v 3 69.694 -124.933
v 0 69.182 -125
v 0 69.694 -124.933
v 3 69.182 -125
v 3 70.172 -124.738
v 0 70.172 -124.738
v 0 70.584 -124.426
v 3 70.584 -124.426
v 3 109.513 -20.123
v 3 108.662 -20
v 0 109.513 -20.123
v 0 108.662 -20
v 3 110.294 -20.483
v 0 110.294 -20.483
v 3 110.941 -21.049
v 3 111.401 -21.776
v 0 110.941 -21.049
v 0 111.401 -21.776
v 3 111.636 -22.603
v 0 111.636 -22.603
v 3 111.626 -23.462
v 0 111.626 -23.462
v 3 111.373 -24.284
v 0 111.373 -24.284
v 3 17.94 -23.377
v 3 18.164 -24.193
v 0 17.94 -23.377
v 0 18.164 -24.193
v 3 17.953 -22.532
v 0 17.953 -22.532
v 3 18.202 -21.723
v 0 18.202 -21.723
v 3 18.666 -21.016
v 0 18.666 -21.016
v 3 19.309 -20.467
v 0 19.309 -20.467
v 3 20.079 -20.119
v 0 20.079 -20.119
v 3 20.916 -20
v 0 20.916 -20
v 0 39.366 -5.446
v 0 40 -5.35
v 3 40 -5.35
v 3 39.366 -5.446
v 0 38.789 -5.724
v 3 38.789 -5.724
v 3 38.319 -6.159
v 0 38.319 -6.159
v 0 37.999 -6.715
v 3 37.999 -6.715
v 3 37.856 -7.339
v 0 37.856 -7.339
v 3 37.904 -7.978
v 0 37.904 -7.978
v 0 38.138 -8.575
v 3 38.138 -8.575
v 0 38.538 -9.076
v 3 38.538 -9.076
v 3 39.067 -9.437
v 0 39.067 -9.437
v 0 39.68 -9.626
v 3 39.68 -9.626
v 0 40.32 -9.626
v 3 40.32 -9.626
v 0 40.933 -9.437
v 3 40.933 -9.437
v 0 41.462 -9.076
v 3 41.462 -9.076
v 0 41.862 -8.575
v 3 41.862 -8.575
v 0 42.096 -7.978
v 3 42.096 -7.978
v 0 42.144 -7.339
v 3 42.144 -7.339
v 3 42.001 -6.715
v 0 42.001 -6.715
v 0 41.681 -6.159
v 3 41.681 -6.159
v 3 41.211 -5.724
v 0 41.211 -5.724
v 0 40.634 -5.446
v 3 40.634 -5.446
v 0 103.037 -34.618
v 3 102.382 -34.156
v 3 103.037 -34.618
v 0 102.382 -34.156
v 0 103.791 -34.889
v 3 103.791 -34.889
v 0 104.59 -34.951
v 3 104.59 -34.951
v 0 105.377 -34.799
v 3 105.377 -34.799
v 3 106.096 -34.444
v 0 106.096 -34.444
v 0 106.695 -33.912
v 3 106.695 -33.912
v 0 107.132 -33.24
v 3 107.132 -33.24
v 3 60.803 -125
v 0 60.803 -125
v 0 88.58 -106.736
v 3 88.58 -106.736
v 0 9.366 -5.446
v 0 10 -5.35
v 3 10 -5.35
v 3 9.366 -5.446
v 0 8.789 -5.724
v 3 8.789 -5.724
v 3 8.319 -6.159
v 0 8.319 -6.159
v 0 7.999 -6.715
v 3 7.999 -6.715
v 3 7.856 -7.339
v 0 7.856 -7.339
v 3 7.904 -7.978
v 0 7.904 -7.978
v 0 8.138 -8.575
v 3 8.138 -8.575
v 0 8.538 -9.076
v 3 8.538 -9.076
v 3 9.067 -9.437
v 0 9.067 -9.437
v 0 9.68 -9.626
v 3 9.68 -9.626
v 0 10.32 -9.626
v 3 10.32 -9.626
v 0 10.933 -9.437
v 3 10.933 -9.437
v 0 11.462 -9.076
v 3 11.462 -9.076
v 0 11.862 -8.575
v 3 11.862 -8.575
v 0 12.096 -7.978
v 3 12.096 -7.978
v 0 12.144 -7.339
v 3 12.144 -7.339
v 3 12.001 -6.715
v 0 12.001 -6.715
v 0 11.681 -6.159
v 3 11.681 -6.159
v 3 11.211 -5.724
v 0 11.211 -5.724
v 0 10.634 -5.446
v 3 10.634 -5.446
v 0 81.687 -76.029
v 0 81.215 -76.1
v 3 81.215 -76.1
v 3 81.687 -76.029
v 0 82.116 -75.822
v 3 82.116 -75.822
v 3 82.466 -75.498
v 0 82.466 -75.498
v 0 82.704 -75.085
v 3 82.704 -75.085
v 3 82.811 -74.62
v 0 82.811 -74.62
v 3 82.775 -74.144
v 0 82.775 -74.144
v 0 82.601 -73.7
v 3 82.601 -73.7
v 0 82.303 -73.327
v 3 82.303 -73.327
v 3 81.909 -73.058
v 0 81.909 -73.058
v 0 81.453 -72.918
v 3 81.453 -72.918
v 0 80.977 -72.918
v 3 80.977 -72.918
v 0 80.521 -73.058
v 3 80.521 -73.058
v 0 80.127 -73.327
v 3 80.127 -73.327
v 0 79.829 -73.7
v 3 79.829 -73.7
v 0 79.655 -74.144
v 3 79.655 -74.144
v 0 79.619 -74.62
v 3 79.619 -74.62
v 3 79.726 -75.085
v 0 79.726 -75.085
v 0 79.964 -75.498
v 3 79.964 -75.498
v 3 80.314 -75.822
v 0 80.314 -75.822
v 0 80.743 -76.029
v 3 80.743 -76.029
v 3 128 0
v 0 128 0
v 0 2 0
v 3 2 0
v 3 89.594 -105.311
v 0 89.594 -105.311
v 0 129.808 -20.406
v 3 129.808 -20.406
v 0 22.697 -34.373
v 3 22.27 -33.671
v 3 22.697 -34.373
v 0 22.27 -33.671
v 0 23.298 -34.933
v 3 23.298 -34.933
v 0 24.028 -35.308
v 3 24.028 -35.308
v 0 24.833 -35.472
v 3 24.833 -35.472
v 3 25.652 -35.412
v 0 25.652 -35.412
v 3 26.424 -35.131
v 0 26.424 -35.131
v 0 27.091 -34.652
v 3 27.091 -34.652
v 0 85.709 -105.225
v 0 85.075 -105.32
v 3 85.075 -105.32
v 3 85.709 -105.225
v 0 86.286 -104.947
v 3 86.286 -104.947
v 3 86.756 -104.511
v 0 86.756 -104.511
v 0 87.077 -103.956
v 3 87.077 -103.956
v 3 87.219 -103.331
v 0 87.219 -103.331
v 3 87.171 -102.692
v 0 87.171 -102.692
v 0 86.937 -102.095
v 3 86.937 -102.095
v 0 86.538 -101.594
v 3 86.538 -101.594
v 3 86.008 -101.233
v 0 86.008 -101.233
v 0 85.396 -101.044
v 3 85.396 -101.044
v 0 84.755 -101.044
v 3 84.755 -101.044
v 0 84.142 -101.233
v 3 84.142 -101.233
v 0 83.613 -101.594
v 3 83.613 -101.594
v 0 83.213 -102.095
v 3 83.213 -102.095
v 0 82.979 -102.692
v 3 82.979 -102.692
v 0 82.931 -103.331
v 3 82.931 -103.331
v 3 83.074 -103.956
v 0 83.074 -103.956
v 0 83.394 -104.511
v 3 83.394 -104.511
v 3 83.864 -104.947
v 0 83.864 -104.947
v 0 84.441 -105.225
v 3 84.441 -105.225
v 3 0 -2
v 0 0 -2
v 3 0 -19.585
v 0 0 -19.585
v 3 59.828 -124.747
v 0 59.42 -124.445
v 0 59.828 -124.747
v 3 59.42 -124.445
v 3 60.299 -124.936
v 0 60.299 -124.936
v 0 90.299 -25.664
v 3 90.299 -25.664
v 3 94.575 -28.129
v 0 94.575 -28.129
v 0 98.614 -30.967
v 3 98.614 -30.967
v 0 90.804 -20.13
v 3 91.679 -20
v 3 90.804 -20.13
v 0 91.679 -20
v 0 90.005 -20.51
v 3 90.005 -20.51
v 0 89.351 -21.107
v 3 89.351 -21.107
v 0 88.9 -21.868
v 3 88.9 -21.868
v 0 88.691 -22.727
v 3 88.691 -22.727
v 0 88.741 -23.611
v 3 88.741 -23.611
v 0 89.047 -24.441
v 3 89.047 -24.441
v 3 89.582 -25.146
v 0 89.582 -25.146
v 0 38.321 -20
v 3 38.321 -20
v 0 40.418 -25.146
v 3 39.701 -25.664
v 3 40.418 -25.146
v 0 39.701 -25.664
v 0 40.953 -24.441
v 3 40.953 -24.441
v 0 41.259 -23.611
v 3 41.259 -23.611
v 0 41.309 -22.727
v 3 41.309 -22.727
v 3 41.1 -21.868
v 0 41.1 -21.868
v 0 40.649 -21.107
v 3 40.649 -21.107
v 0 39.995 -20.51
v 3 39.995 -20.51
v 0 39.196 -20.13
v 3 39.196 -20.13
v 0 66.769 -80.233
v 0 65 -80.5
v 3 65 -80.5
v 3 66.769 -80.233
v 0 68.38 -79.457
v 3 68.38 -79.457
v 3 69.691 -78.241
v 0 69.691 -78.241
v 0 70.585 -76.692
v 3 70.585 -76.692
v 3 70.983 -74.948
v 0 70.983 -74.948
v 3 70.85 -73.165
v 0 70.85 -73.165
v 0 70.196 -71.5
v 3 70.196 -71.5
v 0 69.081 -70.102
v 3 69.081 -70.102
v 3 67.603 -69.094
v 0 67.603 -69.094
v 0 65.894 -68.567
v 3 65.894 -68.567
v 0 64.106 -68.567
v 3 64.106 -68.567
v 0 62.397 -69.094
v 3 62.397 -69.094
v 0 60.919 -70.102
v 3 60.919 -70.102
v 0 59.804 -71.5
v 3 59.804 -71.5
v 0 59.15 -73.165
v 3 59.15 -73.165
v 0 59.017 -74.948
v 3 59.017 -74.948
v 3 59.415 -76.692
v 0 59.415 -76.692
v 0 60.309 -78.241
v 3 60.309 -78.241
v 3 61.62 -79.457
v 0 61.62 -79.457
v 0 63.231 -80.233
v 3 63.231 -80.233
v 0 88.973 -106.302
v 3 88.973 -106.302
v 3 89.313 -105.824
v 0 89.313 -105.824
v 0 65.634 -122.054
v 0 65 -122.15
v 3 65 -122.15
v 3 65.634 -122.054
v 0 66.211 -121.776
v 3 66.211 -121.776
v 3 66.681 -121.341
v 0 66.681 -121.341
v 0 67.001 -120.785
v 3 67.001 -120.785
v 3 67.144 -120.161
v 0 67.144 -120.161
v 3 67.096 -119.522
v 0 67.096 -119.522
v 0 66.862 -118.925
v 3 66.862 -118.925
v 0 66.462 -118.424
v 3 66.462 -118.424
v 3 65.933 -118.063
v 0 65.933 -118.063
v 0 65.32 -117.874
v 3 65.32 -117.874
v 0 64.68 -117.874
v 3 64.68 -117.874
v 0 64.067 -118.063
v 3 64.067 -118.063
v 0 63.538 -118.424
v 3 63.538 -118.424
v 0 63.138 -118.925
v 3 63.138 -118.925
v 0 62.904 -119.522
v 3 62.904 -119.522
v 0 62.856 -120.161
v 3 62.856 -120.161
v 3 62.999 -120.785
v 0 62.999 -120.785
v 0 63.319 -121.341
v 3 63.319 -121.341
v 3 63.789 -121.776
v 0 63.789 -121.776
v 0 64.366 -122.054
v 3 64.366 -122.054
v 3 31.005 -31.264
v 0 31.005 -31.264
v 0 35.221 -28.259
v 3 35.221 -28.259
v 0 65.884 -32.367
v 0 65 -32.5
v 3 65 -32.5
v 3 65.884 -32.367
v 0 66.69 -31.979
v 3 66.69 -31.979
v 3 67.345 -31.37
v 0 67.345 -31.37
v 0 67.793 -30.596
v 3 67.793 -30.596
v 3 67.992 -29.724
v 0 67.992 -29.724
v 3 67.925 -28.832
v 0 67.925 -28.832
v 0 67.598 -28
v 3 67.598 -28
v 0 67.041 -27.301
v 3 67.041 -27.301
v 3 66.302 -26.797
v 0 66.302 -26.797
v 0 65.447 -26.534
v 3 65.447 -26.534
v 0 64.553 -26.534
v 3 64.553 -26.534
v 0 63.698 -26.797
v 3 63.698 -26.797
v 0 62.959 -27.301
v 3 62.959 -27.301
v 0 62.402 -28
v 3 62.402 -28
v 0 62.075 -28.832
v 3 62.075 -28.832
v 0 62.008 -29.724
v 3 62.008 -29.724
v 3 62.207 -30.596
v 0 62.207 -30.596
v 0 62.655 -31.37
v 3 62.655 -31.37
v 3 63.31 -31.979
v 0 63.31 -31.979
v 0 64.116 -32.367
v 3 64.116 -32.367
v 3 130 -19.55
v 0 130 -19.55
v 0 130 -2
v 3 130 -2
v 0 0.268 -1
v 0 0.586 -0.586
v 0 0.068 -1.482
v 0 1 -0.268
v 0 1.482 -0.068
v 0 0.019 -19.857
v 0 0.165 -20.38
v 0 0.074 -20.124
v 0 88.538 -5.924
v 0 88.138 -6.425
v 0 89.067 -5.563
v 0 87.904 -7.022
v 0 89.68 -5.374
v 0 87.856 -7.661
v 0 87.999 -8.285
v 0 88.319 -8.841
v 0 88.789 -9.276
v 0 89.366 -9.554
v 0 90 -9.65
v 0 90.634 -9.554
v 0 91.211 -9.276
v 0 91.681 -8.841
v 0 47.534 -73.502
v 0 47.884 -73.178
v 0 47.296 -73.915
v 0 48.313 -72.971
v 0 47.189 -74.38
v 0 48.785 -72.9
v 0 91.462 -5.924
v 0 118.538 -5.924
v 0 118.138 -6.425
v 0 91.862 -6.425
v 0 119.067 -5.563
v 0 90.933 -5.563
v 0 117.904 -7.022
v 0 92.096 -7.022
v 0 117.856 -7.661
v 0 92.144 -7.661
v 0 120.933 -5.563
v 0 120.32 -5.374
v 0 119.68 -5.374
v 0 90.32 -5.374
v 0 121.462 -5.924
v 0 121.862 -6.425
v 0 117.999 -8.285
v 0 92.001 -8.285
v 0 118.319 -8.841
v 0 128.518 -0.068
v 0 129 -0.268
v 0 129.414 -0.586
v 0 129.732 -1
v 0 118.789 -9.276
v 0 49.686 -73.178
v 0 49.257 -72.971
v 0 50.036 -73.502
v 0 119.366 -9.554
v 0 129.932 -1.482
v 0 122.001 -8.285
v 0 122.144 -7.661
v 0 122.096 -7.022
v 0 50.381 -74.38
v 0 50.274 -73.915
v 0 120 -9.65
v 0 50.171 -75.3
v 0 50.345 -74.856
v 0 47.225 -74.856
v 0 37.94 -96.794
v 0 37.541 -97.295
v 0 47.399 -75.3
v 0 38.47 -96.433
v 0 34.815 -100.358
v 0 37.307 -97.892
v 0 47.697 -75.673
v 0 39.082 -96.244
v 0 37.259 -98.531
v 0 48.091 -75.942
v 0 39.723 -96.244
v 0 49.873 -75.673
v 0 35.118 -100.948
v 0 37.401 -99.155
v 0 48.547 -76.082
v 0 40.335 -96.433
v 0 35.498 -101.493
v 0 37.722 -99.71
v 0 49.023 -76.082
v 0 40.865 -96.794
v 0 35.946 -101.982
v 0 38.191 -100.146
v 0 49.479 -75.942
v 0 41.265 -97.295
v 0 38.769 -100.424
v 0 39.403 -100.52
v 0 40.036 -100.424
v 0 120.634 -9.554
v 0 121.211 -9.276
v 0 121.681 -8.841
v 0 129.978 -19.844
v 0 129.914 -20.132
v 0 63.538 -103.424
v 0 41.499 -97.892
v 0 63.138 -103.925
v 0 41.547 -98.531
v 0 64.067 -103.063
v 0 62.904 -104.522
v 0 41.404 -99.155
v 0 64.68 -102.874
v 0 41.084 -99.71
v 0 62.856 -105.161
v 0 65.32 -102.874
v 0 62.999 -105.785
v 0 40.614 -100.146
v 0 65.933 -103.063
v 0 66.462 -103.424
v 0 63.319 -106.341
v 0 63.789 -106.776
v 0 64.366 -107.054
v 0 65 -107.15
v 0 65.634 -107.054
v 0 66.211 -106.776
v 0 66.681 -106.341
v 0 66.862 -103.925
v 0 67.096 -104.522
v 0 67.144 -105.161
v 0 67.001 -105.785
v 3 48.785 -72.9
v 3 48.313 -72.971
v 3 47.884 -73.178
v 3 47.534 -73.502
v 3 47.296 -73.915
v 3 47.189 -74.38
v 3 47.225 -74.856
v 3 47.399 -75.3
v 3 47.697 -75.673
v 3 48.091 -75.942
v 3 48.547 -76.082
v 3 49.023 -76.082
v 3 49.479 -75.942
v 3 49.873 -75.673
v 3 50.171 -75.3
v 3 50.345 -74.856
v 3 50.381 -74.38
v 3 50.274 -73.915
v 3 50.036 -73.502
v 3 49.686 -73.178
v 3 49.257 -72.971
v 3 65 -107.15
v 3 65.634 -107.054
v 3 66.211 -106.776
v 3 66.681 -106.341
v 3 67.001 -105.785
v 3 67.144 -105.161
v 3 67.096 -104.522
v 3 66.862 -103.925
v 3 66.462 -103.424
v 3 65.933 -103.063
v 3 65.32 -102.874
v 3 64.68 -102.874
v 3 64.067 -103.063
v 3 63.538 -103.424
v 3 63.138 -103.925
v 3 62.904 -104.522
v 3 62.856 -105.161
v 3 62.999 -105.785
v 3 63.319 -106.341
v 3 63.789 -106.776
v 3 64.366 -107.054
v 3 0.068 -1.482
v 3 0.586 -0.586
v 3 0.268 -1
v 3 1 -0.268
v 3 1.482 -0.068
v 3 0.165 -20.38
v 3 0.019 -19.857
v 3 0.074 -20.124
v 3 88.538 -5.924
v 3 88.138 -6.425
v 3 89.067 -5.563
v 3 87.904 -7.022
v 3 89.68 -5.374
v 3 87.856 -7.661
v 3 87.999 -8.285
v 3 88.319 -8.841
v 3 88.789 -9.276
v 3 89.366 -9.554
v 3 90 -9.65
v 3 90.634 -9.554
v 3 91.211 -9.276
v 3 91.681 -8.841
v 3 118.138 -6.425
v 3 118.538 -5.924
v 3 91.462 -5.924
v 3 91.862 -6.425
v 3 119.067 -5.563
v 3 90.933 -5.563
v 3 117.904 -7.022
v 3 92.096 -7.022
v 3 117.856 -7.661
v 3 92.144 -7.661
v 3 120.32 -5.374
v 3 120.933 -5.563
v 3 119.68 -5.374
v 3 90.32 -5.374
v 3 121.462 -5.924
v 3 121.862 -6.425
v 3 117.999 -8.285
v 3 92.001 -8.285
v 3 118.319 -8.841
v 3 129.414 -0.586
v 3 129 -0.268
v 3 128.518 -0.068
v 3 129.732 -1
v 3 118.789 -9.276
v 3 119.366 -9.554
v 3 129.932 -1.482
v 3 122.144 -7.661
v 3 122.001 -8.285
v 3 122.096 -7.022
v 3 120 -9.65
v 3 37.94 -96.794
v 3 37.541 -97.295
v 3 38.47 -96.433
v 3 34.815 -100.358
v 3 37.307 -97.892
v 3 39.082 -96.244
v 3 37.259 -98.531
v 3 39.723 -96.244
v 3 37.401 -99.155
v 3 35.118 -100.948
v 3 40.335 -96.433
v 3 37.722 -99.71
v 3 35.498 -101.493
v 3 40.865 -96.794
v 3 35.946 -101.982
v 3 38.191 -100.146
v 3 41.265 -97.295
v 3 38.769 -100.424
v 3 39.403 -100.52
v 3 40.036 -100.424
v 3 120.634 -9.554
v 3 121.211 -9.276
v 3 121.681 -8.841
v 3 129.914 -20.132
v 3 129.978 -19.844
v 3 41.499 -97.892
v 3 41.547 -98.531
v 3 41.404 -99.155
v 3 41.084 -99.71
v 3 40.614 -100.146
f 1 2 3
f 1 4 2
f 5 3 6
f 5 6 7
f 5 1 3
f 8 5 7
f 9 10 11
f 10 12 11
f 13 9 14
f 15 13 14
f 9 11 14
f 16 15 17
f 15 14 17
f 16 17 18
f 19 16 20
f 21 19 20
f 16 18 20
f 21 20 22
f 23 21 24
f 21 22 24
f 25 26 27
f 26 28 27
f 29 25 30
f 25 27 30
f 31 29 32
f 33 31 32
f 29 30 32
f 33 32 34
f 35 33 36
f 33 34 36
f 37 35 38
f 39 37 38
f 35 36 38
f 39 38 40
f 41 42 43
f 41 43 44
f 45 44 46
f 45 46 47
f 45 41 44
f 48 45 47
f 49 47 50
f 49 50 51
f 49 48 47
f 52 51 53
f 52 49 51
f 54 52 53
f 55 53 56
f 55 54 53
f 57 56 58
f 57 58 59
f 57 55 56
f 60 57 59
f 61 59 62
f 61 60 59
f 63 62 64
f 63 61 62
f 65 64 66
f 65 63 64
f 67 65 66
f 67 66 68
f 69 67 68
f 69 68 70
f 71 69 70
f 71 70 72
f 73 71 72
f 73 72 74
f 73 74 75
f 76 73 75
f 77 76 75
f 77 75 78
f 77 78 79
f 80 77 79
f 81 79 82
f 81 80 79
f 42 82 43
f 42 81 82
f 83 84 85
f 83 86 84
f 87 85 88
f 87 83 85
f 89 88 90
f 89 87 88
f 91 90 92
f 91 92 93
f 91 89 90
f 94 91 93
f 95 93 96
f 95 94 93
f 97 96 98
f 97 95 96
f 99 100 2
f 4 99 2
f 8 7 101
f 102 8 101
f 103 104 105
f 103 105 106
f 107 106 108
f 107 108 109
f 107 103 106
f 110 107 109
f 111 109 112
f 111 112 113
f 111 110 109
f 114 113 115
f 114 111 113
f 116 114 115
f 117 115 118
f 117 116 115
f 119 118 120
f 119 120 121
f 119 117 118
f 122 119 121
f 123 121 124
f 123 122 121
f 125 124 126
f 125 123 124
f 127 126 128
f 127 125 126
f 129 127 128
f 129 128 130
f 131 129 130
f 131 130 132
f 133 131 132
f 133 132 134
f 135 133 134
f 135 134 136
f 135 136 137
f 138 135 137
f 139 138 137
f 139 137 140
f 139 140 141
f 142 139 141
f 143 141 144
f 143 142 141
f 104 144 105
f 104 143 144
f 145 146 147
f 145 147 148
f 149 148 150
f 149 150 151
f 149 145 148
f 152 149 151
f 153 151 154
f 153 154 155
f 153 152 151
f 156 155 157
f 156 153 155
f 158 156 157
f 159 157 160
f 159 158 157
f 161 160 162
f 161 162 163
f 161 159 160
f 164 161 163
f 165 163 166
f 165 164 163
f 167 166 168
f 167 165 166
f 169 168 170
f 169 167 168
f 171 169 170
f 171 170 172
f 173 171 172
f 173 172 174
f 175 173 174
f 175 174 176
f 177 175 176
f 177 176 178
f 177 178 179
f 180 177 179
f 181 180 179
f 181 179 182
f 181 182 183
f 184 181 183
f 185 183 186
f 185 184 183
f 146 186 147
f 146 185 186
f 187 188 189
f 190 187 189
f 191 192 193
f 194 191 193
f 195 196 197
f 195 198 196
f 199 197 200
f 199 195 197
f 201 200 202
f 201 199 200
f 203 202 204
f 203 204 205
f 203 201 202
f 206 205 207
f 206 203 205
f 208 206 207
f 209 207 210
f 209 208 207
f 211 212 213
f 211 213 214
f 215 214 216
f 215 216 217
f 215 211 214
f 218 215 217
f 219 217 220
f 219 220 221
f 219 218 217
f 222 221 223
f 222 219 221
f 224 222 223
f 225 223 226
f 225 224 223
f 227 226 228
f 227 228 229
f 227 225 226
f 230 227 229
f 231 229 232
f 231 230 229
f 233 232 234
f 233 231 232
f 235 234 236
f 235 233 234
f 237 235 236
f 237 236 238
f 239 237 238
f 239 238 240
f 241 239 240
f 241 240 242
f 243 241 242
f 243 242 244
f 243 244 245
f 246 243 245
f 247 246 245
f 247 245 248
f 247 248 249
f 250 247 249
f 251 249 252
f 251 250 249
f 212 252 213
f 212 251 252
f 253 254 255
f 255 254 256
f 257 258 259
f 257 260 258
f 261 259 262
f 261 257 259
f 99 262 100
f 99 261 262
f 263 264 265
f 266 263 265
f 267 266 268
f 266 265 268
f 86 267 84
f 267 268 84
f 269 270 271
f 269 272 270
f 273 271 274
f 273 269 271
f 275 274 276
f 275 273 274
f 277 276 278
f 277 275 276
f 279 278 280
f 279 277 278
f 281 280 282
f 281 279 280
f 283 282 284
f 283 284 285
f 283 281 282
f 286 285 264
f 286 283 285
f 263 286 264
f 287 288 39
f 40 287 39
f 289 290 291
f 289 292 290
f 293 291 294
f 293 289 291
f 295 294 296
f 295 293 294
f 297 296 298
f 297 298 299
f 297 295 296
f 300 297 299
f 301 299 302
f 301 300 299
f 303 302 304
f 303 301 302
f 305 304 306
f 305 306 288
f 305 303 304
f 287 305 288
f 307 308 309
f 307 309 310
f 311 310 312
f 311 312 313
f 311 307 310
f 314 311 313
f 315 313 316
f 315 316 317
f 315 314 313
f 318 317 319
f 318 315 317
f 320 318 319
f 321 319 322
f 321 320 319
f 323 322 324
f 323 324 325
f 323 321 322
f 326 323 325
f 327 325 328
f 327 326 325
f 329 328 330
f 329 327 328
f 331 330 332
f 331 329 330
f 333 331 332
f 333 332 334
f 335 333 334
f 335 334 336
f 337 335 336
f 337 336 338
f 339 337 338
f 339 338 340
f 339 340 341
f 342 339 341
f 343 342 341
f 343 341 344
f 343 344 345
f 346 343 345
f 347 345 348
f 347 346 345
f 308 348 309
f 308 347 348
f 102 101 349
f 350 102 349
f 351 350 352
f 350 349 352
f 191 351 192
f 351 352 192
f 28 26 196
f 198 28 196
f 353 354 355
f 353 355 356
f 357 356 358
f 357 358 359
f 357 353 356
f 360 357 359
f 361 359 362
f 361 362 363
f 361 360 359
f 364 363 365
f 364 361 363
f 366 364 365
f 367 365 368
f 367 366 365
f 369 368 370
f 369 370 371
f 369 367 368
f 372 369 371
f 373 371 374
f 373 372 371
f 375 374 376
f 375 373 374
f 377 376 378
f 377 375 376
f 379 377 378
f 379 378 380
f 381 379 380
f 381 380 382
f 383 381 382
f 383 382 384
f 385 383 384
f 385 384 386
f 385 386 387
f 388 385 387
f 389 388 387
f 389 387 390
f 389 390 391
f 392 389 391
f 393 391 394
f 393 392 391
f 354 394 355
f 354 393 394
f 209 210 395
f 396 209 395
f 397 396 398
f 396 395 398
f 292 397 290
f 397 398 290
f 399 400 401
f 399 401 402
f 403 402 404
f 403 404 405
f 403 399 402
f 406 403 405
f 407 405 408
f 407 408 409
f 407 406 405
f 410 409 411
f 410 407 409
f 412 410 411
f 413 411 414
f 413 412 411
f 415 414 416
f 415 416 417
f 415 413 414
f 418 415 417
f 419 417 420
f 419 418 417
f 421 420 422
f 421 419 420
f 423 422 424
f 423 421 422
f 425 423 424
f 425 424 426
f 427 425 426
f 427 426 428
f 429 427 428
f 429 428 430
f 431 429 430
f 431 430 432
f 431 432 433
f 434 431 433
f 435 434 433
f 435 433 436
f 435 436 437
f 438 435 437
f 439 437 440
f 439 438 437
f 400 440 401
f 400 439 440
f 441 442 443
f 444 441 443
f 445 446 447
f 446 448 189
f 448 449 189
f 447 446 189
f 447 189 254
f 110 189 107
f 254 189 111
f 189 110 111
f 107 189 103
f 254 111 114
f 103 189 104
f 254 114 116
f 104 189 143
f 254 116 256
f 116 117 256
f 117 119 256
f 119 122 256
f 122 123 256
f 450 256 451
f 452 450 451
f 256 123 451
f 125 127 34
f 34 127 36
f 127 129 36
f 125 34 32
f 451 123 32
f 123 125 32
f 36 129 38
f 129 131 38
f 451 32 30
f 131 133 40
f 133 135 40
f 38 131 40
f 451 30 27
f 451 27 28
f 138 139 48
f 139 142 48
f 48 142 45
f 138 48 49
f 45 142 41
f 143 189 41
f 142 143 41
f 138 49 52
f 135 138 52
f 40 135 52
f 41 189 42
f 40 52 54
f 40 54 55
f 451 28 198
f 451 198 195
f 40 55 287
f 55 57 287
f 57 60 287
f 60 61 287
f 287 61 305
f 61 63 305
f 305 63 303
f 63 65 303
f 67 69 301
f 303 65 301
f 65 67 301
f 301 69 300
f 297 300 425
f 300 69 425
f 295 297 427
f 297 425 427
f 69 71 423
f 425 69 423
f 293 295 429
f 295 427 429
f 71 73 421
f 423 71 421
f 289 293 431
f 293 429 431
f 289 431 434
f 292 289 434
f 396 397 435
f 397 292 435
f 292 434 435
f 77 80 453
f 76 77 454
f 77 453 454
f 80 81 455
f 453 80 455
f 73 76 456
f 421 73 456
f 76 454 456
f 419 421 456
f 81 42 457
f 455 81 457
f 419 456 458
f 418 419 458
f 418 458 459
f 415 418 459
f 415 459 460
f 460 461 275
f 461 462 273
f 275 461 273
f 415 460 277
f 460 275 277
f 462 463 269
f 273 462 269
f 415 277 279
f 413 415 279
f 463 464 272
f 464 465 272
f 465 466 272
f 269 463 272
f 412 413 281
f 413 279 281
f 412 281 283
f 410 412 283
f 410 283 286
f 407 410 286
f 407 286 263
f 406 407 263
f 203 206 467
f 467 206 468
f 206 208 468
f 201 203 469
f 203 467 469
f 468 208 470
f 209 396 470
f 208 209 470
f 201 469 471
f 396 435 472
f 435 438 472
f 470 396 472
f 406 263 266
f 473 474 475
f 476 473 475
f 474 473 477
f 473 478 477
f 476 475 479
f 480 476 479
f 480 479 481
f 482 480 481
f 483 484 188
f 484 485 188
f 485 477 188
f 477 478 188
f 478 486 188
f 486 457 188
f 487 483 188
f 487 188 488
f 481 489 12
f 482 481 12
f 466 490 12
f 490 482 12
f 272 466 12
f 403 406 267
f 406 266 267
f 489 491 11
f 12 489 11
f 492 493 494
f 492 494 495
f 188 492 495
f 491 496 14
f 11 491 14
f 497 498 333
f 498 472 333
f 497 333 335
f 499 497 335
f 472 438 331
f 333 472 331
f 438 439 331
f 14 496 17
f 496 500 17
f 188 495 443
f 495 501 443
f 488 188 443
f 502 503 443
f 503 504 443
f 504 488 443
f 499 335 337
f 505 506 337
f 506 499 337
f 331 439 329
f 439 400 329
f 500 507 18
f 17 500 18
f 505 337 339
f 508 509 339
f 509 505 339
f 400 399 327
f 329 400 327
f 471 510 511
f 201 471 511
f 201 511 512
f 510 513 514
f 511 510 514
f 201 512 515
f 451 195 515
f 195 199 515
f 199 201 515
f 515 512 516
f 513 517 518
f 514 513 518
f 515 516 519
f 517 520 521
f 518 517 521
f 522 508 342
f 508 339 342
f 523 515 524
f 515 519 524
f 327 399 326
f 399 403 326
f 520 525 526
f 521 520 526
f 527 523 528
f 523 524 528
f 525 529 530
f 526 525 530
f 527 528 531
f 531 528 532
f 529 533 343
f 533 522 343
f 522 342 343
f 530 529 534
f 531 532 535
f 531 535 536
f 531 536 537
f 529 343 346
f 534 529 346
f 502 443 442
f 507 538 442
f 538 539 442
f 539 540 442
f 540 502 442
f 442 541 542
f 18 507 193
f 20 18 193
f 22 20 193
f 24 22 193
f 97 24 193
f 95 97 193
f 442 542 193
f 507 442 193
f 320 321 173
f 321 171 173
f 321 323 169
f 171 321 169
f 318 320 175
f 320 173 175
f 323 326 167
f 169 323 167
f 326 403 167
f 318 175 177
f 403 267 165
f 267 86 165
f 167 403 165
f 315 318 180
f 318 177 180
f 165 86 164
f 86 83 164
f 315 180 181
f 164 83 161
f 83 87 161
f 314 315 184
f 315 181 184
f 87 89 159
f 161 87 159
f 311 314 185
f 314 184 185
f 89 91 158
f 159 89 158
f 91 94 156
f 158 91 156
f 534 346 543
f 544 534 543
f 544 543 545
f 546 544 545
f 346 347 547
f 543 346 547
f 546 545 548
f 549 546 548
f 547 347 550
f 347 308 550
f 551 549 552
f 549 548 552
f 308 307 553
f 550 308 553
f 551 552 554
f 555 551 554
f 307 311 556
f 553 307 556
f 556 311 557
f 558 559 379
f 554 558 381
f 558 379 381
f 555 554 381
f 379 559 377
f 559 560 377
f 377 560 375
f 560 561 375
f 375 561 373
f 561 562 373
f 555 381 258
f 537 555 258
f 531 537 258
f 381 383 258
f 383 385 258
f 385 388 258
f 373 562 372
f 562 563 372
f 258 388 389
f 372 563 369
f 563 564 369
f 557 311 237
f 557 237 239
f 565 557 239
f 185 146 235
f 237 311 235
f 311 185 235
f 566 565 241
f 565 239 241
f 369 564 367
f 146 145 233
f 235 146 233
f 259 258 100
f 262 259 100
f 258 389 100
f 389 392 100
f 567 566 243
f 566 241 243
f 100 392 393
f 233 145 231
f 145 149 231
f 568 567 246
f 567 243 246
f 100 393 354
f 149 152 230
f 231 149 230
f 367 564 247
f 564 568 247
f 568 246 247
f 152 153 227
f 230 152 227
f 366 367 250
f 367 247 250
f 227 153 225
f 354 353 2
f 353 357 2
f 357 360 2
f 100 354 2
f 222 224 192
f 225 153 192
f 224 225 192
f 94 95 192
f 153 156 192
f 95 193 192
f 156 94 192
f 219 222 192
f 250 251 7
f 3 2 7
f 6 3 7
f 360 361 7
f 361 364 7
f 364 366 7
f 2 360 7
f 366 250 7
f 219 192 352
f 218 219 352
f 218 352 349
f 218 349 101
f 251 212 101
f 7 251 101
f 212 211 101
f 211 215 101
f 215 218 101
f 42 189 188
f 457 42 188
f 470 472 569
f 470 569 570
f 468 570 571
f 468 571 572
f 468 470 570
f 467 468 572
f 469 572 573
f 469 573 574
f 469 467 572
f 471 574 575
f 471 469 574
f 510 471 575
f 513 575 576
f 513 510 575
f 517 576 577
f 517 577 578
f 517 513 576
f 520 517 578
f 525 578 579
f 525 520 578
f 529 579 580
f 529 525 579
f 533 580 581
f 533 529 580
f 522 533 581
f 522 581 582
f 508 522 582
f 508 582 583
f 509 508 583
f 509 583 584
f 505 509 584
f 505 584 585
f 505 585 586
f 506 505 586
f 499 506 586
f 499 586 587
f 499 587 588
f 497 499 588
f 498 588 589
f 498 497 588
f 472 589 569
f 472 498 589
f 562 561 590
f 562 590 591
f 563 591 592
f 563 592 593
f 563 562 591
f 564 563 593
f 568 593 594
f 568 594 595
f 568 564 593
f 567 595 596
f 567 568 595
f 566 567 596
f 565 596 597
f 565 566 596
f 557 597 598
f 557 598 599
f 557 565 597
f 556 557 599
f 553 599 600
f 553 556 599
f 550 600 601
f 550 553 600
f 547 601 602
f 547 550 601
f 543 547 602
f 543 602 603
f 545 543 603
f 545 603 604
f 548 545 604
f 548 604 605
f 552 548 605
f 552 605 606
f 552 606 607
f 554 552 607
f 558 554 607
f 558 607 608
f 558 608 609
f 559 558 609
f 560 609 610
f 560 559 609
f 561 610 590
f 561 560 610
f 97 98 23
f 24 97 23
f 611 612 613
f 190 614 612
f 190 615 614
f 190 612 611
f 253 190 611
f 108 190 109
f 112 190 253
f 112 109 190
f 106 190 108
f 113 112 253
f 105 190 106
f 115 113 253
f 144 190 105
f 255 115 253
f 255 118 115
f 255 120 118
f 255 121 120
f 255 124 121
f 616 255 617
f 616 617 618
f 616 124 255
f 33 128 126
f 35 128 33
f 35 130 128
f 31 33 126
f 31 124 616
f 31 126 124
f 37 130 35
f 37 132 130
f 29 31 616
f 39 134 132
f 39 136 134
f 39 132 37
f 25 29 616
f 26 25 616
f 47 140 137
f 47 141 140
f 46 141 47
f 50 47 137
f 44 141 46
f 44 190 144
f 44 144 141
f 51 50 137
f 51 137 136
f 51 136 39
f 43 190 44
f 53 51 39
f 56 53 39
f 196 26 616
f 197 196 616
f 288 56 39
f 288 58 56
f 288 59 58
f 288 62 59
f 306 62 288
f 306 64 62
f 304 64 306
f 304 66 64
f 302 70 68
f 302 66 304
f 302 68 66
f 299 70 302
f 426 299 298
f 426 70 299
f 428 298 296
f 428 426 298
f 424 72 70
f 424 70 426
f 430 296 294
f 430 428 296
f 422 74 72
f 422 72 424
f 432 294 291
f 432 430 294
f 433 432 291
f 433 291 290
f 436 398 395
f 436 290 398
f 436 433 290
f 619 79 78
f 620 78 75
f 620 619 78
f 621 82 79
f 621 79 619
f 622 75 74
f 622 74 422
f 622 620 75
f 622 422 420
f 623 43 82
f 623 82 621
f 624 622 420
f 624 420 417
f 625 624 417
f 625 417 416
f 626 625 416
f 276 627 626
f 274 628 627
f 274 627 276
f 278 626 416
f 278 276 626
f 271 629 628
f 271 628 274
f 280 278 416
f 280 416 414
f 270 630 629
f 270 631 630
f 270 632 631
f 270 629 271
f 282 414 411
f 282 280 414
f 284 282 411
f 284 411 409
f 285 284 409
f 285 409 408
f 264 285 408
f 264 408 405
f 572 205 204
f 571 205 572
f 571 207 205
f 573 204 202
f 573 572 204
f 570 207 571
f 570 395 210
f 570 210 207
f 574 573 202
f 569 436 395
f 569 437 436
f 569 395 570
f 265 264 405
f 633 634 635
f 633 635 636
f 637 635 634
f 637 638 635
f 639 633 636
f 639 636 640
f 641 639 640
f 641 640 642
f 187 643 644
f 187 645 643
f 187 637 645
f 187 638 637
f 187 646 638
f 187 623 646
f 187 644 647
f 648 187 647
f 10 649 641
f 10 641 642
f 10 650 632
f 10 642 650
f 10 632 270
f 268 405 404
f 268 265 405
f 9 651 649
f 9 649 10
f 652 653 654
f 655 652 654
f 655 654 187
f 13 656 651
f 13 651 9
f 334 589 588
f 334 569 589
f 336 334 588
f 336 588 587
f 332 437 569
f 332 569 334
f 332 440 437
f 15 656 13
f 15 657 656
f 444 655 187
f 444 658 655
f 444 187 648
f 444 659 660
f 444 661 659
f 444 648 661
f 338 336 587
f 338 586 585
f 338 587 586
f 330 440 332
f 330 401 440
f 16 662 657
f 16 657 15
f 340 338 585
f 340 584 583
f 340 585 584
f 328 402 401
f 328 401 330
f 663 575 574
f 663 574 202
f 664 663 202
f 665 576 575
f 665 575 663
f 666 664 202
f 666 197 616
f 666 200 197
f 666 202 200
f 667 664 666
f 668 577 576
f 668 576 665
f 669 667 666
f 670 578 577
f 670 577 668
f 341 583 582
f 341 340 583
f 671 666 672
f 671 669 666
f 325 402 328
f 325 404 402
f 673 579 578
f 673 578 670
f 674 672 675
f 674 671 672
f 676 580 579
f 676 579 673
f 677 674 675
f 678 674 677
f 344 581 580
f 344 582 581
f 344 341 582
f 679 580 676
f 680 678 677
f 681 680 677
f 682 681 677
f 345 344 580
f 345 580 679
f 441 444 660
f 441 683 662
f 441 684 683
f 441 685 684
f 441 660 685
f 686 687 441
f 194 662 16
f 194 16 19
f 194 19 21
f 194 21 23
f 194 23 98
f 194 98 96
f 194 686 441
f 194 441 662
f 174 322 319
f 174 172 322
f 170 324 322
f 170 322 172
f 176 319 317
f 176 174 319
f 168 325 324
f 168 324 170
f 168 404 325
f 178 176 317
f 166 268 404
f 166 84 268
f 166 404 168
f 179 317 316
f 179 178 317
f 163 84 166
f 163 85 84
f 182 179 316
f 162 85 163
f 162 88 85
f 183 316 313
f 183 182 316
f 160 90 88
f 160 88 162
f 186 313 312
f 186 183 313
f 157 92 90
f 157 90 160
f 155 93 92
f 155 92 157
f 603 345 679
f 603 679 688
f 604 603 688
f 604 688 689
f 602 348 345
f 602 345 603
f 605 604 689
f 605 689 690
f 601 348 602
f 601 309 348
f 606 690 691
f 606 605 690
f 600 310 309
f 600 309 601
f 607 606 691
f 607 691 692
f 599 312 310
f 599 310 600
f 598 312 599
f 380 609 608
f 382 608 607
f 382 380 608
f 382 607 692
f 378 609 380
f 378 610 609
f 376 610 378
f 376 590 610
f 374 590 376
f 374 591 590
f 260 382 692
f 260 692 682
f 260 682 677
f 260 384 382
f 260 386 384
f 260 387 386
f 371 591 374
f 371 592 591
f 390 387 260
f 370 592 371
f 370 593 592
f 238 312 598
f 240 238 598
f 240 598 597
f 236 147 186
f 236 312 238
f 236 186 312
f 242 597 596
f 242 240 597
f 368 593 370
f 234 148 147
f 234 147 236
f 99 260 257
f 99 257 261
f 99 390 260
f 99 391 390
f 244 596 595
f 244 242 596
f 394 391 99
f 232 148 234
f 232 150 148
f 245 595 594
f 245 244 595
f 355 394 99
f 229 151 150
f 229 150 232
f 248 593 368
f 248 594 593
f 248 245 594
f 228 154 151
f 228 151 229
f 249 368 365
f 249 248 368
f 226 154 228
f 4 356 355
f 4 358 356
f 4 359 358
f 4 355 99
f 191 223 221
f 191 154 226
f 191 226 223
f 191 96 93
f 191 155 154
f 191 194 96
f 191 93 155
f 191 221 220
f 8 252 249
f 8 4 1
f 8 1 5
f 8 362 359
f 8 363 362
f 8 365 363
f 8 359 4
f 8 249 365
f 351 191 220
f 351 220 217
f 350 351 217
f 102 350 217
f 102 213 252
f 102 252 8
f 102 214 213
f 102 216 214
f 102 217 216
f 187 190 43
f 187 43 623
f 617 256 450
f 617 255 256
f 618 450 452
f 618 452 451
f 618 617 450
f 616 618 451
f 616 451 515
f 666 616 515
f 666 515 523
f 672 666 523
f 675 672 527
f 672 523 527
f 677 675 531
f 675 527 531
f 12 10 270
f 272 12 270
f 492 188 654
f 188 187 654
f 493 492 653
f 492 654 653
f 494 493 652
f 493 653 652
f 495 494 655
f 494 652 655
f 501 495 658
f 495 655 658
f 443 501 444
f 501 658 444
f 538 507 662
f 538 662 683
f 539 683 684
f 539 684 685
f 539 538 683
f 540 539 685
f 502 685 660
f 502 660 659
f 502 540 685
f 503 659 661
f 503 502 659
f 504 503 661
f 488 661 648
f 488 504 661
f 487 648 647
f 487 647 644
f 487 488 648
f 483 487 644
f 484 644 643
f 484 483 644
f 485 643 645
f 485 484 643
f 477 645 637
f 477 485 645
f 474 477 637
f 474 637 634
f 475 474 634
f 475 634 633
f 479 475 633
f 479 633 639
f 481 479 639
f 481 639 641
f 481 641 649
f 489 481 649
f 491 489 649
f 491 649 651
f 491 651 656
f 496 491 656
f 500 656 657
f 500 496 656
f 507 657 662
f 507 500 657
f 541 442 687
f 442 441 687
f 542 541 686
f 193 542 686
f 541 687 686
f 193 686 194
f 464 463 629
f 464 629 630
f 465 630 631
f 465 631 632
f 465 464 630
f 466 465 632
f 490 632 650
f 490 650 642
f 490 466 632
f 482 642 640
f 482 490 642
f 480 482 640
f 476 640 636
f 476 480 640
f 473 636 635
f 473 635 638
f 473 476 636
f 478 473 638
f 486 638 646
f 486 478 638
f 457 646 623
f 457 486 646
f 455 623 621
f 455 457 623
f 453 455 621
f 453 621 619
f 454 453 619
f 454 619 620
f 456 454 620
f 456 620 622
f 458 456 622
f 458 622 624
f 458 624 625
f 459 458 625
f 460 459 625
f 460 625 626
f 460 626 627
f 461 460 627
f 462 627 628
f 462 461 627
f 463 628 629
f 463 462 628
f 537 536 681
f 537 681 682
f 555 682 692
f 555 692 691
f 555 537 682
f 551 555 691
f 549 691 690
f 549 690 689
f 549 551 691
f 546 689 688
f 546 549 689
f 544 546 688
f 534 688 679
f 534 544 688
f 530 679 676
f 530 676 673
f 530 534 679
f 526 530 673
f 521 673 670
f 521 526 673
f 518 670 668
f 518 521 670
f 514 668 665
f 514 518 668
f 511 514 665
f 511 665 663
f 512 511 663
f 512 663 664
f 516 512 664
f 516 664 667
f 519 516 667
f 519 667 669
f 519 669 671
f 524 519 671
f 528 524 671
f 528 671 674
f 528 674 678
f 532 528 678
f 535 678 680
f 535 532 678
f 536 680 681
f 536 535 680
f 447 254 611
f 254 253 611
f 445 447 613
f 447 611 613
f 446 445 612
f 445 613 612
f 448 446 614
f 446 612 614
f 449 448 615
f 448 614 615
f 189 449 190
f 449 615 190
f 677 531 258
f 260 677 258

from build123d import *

# Parameters (mm, degrees)
SKETCH_1_R          = 2.15
SKETCH_1_R_2        = 6
SKETCH_1_R_3        = 3
SKETCH_1_R_4        = 1.6
EXTRUDE_1_DEPTH     = 3
CUT_EXTRUDE_1_DEPTH = 3
FILLET_1_R          = 2
FILLET_2_R          = 3


with BuildPart() as part:
    # ｽｹｯﾁ1 → ﾎﾞｽ - 押し出し1 (new body)
    with BuildSketch(Plane(origin=(0, 0, 0), x_dir=(0, 0, -1), z_dir=(1, 0, 0))):
        with BuildLine():
            Line((0, 0), (20, 0))
            Line((20, 0), (100.357645767, 34.814697588))
            ThreePointArc((100.357645767, 34.814697588), (101.226596702, 35.299021126), (101.982464697, 35.94578893))
            Line((101.982464697, 35.94578893), (125, 60))
            Line((125, 60), (125, 70))
            Line((125, 70), (106.736076333, 88.580227744))
            ThreePointArc((106.736076333, 88.580227744), (106.067997995, 89.149910996), (105.310570653, 89.593950967))
            Line((105.310570653, 89.593950967), (20, 130))
            Line((20, 130), (0, 130))
            Line((0, 130), (0, 0))
        make_face()
        with Locations((7.5, 120)):
            Circle(SKETCH_1_R, mode=Mode.SUBTRACT)
        with Locations((7.5, 90)):
            Circle(SKETCH_1_R, mode=Mode.SUBTRACT)
        with Locations(Location((7.5, 40, 0), (0, 0, 180))):
            Circle(SKETCH_1_R, mode=Mode.SUBTRACT)
        with Locations(Location((7.5, 10, 0), (0, 0, 180))):
            Circle(SKETCH_1_R, mode=Mode.SUBTRACT)
        with Locations((74.5, 65)):
            Circle(SKETCH_1_R_2, mode=Mode.SUBTRACT)
        with Locations((29.5, 65)):
            Circle(SKETCH_1_R_3, mode=Mode.SUBTRACT)
        with Locations((103.17032155, 85.075175272)):
            Circle(SKETCH_1_R, mode=Mode.SUBTRACT)
        with Locations((98.369942602, 39.402620443)):
            Circle(SKETCH_1_R, mode=Mode.SUBTRACT)
        with Locations((74.5, 81.215)):
            Circle(SKETCH_1_R_4, mode=Mode.SUBTRACT)
        with Locations(Location((74.5, 48.785, 0), (0, 0, 180))):
            Circle(SKETCH_1_R_4, mode=Mode.SUBTRACT)
        with Locations((105, 65)):
            Circle(SKETCH_1_R, mode=Mode.SUBTRACT)
        with Locations((120, 65)):
            Circle(SKETCH_1_R, mode=Mode.SUBTRACT)
    extrude(amount=EXTRUDE_1_DEPTH)

    # ｽｹｯﾁ2 → ｶｯﾄ - 押し出し1 (cut)
    with BuildSketch(Plane(origin=(3, 0, 0), x_dir=(0, 0, -1), z_dir=(1, 0, 0))):
        with BuildLine():
            Line((20, 113.402584003), (20, 72.399324293))
            ThreePointArc((20, 72.399324293), (25.68439104, 90.338435663), (37.083419962, 105.311283015))
            Line((37.083419962, 105.311283015), (20, 113.402584003))
        make_face()
        with BuildLine():
            Line((20, 16.347267022), (37.782097447, 24.051304879))
            ThreePointArc((37.782097447, 24.051304879), (25.904048448, 39.242797265), (20, 57.600675707))
            Line((20, 57.600675707), (20, 16.347267022))
        make_face()
    extrude(amount=-CUT_EXTRUDE_1_DEPTH, mode=Mode.SUBTRACT)

    # ﾌｨﾚｯﾄ1
    fillet_1_edges = [part.edges().sort_by_distance(p)[0] for p in [
        (1.5, 130, 0),
        (1.5, 130, -20),
        (1.5, 70, -125),
        (1.5, 60, -125),
        (1.5, 0, -20),
        (1.5, 0, 0),
    ]]
    fillet(fillet_1_edges, radius=FILLET_1_R)

    # ﾌｨﾚｯﾄ2
    fillet_2_edges = [part.edges().sort_by_distance(p)[0] for p in [
        (1.5, 105.311283015, -37.083419962),
        (1.5, 72.399324293, -20),
        (1.5, 113.402584003, -20),
        (1.5, 57.600675707, -20),
        (1.5, 24.051304879, -37.782097447),
        (1.5, 16.347267022, -20),
    ]]
    fillet(fillet_2_edges, radius=FILLET_2_R)


solid = part.part
